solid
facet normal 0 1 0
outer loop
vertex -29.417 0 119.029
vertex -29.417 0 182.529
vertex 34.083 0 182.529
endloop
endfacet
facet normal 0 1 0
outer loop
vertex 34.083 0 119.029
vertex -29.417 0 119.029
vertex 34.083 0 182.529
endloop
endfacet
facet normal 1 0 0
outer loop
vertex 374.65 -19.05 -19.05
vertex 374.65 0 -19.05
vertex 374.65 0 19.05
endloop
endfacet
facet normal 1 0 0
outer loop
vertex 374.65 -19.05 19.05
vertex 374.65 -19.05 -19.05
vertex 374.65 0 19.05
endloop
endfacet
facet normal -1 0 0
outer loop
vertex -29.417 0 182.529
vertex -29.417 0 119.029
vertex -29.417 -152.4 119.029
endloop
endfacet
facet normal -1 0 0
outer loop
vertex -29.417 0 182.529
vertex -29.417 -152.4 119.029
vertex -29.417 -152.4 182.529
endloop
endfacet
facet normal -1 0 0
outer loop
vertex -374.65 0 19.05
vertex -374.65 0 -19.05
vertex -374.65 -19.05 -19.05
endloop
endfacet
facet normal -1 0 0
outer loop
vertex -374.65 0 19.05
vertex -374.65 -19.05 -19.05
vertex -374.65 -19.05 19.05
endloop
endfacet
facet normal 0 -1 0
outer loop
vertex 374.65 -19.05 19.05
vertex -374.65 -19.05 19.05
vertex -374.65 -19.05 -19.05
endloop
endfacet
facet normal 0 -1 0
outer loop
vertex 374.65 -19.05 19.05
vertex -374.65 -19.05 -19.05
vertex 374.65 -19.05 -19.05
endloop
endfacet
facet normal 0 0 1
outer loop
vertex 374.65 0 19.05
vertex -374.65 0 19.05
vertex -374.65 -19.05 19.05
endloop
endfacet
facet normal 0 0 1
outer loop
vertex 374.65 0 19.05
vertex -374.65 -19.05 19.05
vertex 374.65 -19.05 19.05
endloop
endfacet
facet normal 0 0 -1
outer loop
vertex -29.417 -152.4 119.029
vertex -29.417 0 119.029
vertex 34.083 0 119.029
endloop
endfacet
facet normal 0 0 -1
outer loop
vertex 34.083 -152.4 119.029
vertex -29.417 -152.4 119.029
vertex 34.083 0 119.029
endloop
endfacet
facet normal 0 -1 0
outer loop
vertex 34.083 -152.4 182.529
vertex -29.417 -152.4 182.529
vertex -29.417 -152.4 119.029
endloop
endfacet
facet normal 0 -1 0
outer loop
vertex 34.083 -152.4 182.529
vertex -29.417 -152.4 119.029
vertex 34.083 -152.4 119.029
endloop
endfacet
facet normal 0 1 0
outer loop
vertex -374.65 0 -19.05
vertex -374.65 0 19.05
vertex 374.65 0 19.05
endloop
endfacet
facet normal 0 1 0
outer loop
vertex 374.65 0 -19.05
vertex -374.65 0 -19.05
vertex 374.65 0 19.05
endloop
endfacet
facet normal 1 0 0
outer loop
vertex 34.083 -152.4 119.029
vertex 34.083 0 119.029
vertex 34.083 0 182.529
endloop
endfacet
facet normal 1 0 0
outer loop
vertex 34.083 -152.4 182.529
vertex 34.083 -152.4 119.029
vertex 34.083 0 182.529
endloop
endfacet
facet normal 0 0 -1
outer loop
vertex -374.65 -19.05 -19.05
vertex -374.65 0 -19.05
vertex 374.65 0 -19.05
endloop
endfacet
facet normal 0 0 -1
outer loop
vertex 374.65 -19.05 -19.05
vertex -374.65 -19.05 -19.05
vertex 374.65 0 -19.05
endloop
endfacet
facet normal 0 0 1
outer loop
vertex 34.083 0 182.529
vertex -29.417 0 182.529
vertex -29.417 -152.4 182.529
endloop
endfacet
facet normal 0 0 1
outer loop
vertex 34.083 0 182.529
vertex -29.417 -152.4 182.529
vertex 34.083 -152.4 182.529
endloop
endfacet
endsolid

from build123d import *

# Parameters (mm, degrees)
F0_W     = 749.3
F0_H     = 38.1
F1_DEPTH = 19.05
F2_W     = 63.5
F2_H     = 63.5
F3_DEPTH = 152.4


with BuildPart() as f1:
    # F0 (on Front) → F1 (new body)
    with BuildSketch(Plane.XZ):
        Rectangle(F0_W, F0_H)
    extrude(amount=F1_DEPTH)


with BuildPart() as f3:
    # F2 (on Front) → F3 (new body)
    with BuildSketch(Plane.XZ):
        with Locations((2.333282, 150.778821)):
            Rectangle(F2_W, F2_H)
    extrude(amount=F3_DEPTH)


solid = Compound([f1.part, f3.part])
